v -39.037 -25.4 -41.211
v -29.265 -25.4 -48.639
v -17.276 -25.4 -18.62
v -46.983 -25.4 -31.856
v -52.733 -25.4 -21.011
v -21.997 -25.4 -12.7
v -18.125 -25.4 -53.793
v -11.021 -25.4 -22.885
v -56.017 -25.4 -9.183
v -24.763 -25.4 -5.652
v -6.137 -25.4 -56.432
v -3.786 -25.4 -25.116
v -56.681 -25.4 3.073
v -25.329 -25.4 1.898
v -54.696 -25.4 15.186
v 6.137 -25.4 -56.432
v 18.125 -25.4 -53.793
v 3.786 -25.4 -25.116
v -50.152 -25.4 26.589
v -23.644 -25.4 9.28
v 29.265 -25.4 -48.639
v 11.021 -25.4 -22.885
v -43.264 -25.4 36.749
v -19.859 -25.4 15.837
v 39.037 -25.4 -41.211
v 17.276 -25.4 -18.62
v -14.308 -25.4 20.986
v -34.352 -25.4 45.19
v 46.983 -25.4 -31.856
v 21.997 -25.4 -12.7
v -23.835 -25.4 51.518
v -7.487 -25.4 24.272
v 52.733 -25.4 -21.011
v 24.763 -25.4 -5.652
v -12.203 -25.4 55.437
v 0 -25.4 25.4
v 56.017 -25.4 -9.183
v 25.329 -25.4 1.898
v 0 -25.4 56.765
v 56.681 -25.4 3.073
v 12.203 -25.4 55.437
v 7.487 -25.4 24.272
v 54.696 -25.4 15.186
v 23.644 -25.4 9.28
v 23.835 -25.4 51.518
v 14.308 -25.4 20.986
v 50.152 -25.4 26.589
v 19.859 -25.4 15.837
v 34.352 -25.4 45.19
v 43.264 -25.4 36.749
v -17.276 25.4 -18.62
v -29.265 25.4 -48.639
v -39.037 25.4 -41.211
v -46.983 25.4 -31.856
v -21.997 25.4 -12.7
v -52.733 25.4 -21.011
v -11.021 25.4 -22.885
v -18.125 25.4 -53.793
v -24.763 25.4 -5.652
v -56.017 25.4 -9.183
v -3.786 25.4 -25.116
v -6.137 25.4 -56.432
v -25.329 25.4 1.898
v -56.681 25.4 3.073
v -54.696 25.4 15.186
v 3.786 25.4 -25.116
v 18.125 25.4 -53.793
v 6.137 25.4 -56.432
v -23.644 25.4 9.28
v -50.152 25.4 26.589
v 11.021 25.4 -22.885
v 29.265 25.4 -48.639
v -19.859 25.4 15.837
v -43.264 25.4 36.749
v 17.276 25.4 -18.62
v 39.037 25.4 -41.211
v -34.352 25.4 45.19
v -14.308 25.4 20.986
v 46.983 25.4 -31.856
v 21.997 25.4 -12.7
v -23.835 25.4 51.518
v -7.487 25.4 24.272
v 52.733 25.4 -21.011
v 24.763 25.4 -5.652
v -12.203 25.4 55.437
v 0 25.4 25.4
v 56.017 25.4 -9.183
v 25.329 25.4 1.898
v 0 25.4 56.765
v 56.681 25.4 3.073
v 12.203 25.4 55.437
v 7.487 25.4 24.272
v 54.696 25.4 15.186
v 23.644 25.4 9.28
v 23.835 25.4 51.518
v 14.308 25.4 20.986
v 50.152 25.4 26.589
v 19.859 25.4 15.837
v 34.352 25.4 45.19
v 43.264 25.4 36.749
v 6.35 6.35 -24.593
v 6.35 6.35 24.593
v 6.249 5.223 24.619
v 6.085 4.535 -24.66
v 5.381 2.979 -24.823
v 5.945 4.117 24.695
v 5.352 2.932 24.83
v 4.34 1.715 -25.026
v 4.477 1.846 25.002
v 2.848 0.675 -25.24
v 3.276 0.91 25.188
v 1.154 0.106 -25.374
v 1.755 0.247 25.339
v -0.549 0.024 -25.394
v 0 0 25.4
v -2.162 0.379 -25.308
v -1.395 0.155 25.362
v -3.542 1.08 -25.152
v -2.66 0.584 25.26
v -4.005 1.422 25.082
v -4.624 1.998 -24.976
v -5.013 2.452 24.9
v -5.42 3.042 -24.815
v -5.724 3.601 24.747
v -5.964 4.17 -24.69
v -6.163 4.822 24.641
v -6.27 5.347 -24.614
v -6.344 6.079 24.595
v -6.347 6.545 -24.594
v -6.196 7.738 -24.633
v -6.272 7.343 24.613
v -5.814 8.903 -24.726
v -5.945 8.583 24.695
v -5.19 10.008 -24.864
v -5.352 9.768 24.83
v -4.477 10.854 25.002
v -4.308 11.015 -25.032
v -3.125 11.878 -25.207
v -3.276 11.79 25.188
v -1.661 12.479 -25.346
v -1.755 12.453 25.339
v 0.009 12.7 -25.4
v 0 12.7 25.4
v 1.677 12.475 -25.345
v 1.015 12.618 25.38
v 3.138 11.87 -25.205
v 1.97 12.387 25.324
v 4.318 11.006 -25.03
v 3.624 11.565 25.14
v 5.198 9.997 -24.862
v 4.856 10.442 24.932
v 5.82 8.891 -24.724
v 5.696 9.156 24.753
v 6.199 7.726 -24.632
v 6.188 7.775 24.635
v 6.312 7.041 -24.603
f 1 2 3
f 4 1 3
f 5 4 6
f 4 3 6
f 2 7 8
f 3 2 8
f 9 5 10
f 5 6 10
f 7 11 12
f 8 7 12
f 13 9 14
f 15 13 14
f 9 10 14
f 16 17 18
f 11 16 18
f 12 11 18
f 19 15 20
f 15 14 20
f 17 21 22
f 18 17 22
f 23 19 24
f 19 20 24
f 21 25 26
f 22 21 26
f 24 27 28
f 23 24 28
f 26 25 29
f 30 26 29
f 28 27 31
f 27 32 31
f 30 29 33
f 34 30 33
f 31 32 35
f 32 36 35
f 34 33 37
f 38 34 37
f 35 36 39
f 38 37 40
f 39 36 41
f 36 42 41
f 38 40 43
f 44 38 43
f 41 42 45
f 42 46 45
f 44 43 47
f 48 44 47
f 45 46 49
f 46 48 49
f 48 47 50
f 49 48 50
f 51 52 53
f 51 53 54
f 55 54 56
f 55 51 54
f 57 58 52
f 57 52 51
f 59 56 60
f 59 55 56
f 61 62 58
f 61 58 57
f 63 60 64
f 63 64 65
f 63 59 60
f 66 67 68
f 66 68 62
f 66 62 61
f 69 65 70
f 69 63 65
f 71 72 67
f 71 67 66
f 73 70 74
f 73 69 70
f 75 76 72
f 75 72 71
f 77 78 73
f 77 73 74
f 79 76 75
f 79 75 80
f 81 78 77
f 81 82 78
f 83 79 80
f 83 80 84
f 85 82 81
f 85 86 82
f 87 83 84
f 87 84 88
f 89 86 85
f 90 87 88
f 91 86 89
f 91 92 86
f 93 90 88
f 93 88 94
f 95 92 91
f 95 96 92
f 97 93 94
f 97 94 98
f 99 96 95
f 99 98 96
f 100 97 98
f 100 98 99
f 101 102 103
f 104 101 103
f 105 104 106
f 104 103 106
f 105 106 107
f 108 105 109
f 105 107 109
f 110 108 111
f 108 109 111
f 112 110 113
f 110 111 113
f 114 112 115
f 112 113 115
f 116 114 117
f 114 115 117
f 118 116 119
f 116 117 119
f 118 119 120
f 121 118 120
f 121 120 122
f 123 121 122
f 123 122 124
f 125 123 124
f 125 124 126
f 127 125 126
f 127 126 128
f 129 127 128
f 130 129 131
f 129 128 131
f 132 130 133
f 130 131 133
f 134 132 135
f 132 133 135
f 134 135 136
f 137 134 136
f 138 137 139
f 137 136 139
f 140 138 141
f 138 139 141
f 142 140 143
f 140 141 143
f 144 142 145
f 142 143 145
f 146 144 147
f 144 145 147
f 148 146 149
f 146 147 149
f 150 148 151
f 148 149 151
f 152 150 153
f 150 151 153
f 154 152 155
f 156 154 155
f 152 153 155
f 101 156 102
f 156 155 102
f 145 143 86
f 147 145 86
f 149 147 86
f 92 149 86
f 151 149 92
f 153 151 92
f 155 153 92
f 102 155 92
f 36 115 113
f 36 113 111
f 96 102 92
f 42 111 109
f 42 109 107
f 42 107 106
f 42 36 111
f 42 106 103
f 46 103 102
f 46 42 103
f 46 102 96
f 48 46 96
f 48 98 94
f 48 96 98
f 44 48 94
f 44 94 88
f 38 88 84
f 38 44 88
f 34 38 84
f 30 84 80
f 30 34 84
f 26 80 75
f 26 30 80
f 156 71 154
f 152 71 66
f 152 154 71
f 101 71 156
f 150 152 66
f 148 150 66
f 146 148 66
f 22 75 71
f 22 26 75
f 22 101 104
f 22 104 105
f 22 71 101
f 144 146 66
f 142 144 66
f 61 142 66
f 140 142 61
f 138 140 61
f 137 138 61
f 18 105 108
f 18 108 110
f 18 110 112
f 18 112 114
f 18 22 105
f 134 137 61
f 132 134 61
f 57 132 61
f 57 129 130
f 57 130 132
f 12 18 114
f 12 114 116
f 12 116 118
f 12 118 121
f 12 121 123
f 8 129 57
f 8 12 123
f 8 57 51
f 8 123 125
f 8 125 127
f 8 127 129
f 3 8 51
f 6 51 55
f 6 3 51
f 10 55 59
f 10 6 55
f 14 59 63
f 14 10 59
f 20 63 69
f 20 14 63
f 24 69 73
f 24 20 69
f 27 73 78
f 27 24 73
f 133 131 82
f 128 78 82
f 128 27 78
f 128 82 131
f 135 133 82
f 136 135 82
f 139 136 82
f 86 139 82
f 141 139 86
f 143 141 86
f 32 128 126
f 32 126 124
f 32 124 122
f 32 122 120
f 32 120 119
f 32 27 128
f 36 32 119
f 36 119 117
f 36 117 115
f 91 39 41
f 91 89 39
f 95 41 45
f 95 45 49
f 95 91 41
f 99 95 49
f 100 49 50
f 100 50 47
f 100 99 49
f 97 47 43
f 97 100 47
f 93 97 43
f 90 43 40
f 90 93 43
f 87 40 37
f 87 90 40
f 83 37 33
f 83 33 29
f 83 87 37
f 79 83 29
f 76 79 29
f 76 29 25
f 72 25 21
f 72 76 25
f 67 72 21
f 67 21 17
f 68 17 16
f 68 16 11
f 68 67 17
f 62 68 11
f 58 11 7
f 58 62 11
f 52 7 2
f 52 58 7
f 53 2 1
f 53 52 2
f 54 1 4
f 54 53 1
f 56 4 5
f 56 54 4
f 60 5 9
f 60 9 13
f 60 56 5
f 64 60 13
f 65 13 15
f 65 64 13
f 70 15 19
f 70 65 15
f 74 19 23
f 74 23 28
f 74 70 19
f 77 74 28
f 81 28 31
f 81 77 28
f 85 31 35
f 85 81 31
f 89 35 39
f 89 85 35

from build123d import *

# Parameters (mm, degrees)
SKETCH1_R               = 56.764595508
BOSS_EXTRUDE1_DEPTH     = 25.4
CUT_EXTRUDE1_DEPTH      = 85.199754194
CUT_EXTRUDE1_DEPTH_BACK = 85.199754194
SKETCH3_R               = 25.4
SKETCH4_W               = 12.7
SKETCH4_H               = 50.8
BOSS_EXTRUDE2_DEPTH     = 12.7
FILLET1_R               = 6.35


with BuildPart() as part:
    # Sketch1 → Boss-Extrude1 (new, symmetric)
    with BuildSketch(Plane(origin=(0, 0, 0), x_dir=(1, 0, 0), z_dir=(0, 1, 0))):
        with Locations(Location((0, 0, 0), (0, 0, 270))):
            Circle(SKETCH1_R)
    extrude(amount=BOSS_EXTRUDE1_DEPTH, both=True)

    # Sketch3 → Cut-Extrude1 (cut, two sides: drawn at the far end of the back side and taken through both)
    with BuildSketch(Plane(origin=(0, 0, 0), x_dir=(1, 0, 0), z_dir=(0, 1, 0)).offset(-CUT_EXTRUDE1_DEPTH_BACK)):
        with Locations(Location((0, 0, 0), (0, 0, 270))):
            Circle(SKETCH3_R)
    extrude(amount=CUT_EXTRUDE1_DEPTH + CUT_EXTRUDE1_DEPTH_BACK, mode=Mode.SUBTRACT)

    # Sketch4 → Boss-Extrude2 (add)
    with BuildSketch(Plane(origin=(0, 0, 0), x_dir=(1, 0, 0), z_dir=(0, 1, 0))):
        Rectangle(SKETCH4_W, SKETCH4_H)
    extrude(amount=BOSS_EXTRUDE2_DEPTH)

    # Fillet1
    # the kernel refuses this fillet: 6.35 mm, written as the material it takes off along each edge
    with BuildSketch(Plane(origin=(-6.35, 0, 40.468444248), x_dir=(0, 1, 0), z_dir=(0, 0, -1))) as fillet1_piece_1_section:
        with BuildLine():
            CenterArc((FILLET1_R, FILLET1_R), FILLET1_R, 180, 90)
            Line((0, FILLET1_R), (0, 0))
            Line((0, 0), (FILLET1_R, 0))
        make_face()
    fillet1_piece_1 = extrude(amount=80.936888497, mode=Mode.PRIVATE)
    fillet1_piece_1 = fillet1_piece_1 & Plane(origin=(0, 1.429605244, 0), x_dir=(0, 0, 1), z_dir=(0, 1, 0)) * Cylinder(25.4, 188, mode=Mode.PRIVATE)
    with BuildSketch(Plane(origin=(-6.35, 12.7, 40.468444248), x_dir=(1, 0, 0), z_dir=(0, 0, -1))) as fillet1_piece_2_section:
        with BuildLine():
            CenterArc((FILLET1_R, FILLET1_R), FILLET1_R, 180, 90)
            Line((0, FILLET1_R), (0, 0))
            Line((0, 0), (FILLET1_R, 0))
        make_face()
    fillet1_piece_2 = extrude(amount=80.936888497, mode=Mode.PRIVATE)
    fillet1_piece_2 = fillet1_piece_2 & Plane(origin=(0, 11.270396349, 0), x_dir=(0, 0, 1), z_dir=(0, 1, 0)) * Cylinder(25.4, 188, mode=Mode.PRIVATE)
    with BuildSketch(Plane(origin=(6.35, 0, -40.468444248), x_dir=(0, 1, 0), z_dir=(0, 0, 1))) as fillet1_piece_3_section:
        with BuildLine():
            CenterArc((FILLET1_R, FILLET1_R), FILLET1_R, 180, 90)
            Line((0, FILLET1_R), (0, 0))
            Line((0, 0), (FILLET1_R, 0))
        make_face()
    fillet1_piece_3 = extrude(amount=80.936888497, mode=Mode.PRIVATE)
    fillet1_piece_3 = fillet1_piece_3 & Plane(origin=(0, 1.429603632, 0), x_dir=(0, 0, 1), z_dir=(0, 1, 0)) * Cylinder(25.4, 188, mode=Mode.PRIVATE)
    with BuildSketch(Plane(origin=(6.35, 12.7, -40.468444248), x_dir=(0, -1, 0), z_dir=(0, 0, 1))) as fillet1_piece_4_section:
        with BuildLine():
            CenterArc((FILLET1_R, -FILLET1_R), FILLET1_R, 90, 90)
            Line((0, -FILLET1_R), (0, 0))
            Line((0, 0), (FILLET1_R, 0))
        make_face()
    fillet1_piece_4 = extrude(amount=80.936888497, mode=Mode.PRIVATE)
    fillet1_piece_4 = fillet1_piece_4 & Plane(origin=(0, 11.270396368, 0), x_dir=(0, 0, 1), z_dir=(0, 1, 0)) * Cylinder(25.4, 188, mode=Mode.PRIVATE)
    add([fillet1_piece_1, fillet1_piece_2, fillet1_piece_3, fillet1_piece_4], mode=Mode.SUBTRACT)


solid = part.part
